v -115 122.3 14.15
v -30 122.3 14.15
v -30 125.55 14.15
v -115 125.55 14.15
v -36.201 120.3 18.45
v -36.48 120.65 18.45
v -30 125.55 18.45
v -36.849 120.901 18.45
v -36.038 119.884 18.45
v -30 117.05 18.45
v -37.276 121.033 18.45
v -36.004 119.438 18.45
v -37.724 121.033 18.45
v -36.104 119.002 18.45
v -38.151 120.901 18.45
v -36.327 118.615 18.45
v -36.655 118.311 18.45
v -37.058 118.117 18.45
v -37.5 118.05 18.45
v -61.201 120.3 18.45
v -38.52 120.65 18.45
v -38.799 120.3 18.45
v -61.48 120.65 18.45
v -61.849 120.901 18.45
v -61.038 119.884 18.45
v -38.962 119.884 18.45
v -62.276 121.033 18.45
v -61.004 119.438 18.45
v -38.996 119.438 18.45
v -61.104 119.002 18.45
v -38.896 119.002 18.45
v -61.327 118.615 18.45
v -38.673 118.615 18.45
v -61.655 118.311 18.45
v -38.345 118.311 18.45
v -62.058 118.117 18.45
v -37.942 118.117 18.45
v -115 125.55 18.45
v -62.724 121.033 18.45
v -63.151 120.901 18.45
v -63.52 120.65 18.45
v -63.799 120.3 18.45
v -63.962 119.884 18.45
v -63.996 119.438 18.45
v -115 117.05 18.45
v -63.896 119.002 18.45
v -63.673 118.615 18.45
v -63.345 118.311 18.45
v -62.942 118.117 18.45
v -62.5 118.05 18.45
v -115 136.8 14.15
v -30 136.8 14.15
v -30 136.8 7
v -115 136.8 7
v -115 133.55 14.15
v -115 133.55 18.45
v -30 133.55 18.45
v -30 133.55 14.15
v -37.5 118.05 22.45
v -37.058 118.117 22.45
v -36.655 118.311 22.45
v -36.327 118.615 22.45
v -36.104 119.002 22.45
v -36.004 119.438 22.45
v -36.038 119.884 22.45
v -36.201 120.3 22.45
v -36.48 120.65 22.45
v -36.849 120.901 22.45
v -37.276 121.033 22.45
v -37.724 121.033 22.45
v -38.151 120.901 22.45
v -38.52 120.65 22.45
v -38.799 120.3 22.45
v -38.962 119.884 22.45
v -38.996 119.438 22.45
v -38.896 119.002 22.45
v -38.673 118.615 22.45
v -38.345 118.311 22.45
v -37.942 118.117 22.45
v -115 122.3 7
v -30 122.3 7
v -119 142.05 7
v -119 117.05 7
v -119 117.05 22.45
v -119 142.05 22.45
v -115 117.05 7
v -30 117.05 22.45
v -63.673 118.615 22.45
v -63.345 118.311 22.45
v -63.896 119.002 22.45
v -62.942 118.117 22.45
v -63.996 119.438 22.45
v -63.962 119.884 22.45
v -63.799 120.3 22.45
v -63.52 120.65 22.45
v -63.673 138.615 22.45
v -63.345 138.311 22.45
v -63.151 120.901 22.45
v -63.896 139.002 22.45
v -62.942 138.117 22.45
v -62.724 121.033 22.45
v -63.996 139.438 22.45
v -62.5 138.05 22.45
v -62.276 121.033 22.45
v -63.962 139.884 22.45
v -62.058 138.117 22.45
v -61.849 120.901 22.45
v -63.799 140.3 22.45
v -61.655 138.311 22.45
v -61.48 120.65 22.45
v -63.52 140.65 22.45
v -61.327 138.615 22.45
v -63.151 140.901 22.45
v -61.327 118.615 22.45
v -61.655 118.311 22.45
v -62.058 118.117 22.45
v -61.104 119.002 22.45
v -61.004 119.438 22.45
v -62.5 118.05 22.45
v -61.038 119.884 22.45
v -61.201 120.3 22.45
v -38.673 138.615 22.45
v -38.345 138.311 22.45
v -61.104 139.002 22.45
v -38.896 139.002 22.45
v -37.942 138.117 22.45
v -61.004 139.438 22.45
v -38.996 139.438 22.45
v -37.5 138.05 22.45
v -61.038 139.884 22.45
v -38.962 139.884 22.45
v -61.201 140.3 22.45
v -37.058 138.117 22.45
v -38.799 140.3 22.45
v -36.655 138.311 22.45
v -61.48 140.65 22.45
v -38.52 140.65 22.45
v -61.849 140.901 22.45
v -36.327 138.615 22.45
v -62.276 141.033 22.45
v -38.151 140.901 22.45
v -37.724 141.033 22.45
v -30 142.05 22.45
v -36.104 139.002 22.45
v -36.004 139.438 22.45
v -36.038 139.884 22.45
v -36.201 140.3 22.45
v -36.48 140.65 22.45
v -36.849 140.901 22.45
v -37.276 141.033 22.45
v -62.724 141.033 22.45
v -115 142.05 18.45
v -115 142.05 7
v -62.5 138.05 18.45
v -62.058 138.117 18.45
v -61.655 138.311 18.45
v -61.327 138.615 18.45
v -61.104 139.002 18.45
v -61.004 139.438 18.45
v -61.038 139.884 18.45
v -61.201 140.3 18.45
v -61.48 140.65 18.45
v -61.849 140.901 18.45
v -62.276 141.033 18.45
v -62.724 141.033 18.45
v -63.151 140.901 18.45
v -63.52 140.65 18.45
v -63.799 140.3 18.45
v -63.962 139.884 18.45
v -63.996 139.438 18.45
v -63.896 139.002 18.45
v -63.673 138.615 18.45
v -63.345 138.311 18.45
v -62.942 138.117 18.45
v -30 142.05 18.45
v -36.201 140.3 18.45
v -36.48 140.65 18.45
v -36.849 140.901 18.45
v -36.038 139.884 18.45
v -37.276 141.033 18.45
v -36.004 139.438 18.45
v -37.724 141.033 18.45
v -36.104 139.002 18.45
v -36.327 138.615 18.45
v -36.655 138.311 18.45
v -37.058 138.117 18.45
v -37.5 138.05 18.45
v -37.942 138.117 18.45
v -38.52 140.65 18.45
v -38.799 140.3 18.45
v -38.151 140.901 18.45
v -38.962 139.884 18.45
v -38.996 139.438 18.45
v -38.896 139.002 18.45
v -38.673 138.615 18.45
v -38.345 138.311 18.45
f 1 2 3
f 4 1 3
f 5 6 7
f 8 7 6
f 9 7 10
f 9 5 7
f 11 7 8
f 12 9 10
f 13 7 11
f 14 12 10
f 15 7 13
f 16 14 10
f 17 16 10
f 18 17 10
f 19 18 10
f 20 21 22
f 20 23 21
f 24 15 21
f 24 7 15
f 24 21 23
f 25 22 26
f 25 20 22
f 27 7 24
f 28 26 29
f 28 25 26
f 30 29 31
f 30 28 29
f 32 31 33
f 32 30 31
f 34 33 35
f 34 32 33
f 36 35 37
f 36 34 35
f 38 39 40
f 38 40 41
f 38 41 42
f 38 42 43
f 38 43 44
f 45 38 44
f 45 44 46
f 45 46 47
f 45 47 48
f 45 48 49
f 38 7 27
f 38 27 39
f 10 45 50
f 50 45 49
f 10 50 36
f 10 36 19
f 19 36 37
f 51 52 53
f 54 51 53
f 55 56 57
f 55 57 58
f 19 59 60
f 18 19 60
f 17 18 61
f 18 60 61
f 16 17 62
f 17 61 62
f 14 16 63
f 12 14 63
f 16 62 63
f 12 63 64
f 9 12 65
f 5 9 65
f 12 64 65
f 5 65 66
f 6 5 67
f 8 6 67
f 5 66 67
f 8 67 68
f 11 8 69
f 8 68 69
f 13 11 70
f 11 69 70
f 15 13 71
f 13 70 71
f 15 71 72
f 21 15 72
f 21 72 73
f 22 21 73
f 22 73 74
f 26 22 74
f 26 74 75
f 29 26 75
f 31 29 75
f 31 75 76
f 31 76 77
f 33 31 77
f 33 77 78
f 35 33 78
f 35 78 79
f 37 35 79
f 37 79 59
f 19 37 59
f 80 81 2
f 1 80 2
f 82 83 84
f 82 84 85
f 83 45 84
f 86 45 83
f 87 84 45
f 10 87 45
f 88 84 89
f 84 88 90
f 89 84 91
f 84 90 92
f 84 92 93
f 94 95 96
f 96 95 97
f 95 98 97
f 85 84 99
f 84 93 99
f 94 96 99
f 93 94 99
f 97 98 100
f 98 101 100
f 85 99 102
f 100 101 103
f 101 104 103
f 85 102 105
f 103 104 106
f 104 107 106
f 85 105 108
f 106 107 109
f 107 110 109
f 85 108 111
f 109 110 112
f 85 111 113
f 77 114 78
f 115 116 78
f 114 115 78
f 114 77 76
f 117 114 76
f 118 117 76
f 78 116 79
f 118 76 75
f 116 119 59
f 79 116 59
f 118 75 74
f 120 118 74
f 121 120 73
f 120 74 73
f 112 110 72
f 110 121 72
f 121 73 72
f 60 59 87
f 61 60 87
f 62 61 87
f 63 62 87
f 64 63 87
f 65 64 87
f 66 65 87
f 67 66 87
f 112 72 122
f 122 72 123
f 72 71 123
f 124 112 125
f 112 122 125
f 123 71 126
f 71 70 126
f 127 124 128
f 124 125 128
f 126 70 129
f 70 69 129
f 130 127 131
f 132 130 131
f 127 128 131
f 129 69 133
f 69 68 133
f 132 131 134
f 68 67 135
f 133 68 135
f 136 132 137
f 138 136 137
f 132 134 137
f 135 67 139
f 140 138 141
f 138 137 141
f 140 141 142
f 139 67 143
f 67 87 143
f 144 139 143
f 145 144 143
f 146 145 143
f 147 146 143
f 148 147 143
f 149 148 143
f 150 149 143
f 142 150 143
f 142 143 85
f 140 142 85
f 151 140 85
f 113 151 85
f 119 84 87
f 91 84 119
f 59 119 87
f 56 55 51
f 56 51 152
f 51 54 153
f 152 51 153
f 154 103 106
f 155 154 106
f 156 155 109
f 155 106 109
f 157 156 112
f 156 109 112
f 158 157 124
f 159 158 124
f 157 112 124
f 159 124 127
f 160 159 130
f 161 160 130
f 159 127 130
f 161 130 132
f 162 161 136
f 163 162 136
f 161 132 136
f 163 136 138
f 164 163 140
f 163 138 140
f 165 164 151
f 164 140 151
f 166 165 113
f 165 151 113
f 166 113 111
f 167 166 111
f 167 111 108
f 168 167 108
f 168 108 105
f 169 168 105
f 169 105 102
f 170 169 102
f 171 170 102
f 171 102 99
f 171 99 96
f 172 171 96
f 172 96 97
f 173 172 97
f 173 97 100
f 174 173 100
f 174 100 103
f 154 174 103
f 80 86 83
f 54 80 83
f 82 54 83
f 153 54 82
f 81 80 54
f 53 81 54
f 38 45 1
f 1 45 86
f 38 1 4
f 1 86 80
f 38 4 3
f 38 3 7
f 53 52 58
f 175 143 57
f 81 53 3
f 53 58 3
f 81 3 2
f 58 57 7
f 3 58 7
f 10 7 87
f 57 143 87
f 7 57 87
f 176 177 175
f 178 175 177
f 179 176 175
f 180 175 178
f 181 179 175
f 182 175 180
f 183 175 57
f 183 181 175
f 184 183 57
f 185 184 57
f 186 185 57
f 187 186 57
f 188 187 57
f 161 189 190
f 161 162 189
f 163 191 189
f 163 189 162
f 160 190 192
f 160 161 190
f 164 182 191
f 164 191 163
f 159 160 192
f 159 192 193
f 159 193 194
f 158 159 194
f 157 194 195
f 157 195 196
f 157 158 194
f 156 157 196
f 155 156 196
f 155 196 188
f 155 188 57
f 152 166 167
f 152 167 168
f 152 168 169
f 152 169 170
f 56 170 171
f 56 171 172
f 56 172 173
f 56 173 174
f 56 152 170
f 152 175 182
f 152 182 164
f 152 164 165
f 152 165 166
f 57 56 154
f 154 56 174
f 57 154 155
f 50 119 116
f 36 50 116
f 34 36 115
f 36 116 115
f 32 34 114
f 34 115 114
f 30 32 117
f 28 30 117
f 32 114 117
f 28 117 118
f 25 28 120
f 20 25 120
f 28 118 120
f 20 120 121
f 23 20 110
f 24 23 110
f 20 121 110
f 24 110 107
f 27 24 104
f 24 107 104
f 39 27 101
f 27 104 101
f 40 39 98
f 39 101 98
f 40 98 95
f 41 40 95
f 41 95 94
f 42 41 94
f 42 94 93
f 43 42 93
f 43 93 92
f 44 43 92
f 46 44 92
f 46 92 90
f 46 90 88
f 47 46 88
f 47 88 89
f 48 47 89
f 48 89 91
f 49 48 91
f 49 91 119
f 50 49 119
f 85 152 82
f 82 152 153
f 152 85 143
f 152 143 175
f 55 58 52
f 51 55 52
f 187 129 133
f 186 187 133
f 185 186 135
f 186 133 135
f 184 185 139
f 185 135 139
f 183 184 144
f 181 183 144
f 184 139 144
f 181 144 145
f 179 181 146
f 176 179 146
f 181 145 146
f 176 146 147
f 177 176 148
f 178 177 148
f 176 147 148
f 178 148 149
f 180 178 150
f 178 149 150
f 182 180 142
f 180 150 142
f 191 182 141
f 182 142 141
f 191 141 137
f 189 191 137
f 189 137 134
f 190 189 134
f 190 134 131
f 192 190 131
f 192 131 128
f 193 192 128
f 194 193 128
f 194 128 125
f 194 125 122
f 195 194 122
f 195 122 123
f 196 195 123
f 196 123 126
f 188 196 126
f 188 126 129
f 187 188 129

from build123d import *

# Parameters (mm, degrees)
PAD120_DEPTH    = 85
SKETCH241_R     = 1.5
POCKET086_DEPTH = 15.451
SKETCH242_W     = 25
SKETCH242_H     = 15.45
PAD121_DEPTH    = 4


with BuildPart() as part:
    # Sketch240 → Pad120 (new body)
    with BuildSketch(Plane.YZ):
        Polygon((-5.25, 11.45), (-5.25, 15.45), (19.75, 15.45), (19.75, 11.45), (11.25, 11.45), (11.25, 7.15), (14.5, 7.15), (14.5, 0), (0, 0), (0, 7.15), (3.25, 7.15), (3.25, 11.45), align=None)
    extrude(amount=PAD120_DEPTH)

    # Sketch241 (on Face2 of Pad120) → Pocket086 (cut, through all)
    with BuildSketch(Plane(origin=(0, 0, 15.45), x_dir=(0, -1, 0), z_dir=(0, 0, 1))):
        with Locations((-17.25, 77.5)):
            Circle(SKETCH241_R)
        with Locations((-17.25, 52.5)):
            Circle(SKETCH241_R)
        with Locations((2.75, 52.5)):
            Circle(SKETCH241_R)
        with Locations((2.75, 77.5)):
            Circle(SKETCH241_R)
    extrude(amount=-POCKET086_DEPTH, mode=Mode.SUBTRACT)

    # Sketch242 (on Face4 of Pocket086) → Pad121 (join)
    with BuildSketch(Plane(origin=(0, 0, 0), x_dir=(0, 1, 0), z_dir=(-1, 0, 0))):
        with Locations((7.25, -7.725)):
            Rectangle(SKETCH242_W, SKETCH242_H)
    extrude(amount=PAD121_DEPTH)


with BuildPart() as part_1:
    # Body140 placement: moved
    add(part.part.moved(Location((-115, 122.3, 7))))


solid = part_1.part
